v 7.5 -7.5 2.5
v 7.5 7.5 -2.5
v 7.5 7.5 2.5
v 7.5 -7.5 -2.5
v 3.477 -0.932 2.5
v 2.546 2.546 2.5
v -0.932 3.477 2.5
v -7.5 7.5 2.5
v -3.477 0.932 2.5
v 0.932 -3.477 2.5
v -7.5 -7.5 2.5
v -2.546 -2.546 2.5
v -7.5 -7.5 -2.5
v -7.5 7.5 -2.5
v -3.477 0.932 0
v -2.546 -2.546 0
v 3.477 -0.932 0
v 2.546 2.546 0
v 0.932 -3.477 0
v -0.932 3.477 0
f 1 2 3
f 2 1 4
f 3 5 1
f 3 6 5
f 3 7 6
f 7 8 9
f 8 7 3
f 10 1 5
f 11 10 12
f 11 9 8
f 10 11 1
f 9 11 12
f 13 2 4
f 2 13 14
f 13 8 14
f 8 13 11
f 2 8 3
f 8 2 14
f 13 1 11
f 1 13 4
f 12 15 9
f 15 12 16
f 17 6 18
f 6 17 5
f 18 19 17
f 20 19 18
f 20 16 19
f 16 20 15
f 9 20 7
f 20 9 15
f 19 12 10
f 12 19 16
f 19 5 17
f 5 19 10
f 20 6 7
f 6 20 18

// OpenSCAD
difference() {
    cube([15,15,5], center=true);
    rotate([0, 0, -135]) rotate([0, 0, 0])cylinder(h = 6, r = 3.6, $fn=6);    
}
